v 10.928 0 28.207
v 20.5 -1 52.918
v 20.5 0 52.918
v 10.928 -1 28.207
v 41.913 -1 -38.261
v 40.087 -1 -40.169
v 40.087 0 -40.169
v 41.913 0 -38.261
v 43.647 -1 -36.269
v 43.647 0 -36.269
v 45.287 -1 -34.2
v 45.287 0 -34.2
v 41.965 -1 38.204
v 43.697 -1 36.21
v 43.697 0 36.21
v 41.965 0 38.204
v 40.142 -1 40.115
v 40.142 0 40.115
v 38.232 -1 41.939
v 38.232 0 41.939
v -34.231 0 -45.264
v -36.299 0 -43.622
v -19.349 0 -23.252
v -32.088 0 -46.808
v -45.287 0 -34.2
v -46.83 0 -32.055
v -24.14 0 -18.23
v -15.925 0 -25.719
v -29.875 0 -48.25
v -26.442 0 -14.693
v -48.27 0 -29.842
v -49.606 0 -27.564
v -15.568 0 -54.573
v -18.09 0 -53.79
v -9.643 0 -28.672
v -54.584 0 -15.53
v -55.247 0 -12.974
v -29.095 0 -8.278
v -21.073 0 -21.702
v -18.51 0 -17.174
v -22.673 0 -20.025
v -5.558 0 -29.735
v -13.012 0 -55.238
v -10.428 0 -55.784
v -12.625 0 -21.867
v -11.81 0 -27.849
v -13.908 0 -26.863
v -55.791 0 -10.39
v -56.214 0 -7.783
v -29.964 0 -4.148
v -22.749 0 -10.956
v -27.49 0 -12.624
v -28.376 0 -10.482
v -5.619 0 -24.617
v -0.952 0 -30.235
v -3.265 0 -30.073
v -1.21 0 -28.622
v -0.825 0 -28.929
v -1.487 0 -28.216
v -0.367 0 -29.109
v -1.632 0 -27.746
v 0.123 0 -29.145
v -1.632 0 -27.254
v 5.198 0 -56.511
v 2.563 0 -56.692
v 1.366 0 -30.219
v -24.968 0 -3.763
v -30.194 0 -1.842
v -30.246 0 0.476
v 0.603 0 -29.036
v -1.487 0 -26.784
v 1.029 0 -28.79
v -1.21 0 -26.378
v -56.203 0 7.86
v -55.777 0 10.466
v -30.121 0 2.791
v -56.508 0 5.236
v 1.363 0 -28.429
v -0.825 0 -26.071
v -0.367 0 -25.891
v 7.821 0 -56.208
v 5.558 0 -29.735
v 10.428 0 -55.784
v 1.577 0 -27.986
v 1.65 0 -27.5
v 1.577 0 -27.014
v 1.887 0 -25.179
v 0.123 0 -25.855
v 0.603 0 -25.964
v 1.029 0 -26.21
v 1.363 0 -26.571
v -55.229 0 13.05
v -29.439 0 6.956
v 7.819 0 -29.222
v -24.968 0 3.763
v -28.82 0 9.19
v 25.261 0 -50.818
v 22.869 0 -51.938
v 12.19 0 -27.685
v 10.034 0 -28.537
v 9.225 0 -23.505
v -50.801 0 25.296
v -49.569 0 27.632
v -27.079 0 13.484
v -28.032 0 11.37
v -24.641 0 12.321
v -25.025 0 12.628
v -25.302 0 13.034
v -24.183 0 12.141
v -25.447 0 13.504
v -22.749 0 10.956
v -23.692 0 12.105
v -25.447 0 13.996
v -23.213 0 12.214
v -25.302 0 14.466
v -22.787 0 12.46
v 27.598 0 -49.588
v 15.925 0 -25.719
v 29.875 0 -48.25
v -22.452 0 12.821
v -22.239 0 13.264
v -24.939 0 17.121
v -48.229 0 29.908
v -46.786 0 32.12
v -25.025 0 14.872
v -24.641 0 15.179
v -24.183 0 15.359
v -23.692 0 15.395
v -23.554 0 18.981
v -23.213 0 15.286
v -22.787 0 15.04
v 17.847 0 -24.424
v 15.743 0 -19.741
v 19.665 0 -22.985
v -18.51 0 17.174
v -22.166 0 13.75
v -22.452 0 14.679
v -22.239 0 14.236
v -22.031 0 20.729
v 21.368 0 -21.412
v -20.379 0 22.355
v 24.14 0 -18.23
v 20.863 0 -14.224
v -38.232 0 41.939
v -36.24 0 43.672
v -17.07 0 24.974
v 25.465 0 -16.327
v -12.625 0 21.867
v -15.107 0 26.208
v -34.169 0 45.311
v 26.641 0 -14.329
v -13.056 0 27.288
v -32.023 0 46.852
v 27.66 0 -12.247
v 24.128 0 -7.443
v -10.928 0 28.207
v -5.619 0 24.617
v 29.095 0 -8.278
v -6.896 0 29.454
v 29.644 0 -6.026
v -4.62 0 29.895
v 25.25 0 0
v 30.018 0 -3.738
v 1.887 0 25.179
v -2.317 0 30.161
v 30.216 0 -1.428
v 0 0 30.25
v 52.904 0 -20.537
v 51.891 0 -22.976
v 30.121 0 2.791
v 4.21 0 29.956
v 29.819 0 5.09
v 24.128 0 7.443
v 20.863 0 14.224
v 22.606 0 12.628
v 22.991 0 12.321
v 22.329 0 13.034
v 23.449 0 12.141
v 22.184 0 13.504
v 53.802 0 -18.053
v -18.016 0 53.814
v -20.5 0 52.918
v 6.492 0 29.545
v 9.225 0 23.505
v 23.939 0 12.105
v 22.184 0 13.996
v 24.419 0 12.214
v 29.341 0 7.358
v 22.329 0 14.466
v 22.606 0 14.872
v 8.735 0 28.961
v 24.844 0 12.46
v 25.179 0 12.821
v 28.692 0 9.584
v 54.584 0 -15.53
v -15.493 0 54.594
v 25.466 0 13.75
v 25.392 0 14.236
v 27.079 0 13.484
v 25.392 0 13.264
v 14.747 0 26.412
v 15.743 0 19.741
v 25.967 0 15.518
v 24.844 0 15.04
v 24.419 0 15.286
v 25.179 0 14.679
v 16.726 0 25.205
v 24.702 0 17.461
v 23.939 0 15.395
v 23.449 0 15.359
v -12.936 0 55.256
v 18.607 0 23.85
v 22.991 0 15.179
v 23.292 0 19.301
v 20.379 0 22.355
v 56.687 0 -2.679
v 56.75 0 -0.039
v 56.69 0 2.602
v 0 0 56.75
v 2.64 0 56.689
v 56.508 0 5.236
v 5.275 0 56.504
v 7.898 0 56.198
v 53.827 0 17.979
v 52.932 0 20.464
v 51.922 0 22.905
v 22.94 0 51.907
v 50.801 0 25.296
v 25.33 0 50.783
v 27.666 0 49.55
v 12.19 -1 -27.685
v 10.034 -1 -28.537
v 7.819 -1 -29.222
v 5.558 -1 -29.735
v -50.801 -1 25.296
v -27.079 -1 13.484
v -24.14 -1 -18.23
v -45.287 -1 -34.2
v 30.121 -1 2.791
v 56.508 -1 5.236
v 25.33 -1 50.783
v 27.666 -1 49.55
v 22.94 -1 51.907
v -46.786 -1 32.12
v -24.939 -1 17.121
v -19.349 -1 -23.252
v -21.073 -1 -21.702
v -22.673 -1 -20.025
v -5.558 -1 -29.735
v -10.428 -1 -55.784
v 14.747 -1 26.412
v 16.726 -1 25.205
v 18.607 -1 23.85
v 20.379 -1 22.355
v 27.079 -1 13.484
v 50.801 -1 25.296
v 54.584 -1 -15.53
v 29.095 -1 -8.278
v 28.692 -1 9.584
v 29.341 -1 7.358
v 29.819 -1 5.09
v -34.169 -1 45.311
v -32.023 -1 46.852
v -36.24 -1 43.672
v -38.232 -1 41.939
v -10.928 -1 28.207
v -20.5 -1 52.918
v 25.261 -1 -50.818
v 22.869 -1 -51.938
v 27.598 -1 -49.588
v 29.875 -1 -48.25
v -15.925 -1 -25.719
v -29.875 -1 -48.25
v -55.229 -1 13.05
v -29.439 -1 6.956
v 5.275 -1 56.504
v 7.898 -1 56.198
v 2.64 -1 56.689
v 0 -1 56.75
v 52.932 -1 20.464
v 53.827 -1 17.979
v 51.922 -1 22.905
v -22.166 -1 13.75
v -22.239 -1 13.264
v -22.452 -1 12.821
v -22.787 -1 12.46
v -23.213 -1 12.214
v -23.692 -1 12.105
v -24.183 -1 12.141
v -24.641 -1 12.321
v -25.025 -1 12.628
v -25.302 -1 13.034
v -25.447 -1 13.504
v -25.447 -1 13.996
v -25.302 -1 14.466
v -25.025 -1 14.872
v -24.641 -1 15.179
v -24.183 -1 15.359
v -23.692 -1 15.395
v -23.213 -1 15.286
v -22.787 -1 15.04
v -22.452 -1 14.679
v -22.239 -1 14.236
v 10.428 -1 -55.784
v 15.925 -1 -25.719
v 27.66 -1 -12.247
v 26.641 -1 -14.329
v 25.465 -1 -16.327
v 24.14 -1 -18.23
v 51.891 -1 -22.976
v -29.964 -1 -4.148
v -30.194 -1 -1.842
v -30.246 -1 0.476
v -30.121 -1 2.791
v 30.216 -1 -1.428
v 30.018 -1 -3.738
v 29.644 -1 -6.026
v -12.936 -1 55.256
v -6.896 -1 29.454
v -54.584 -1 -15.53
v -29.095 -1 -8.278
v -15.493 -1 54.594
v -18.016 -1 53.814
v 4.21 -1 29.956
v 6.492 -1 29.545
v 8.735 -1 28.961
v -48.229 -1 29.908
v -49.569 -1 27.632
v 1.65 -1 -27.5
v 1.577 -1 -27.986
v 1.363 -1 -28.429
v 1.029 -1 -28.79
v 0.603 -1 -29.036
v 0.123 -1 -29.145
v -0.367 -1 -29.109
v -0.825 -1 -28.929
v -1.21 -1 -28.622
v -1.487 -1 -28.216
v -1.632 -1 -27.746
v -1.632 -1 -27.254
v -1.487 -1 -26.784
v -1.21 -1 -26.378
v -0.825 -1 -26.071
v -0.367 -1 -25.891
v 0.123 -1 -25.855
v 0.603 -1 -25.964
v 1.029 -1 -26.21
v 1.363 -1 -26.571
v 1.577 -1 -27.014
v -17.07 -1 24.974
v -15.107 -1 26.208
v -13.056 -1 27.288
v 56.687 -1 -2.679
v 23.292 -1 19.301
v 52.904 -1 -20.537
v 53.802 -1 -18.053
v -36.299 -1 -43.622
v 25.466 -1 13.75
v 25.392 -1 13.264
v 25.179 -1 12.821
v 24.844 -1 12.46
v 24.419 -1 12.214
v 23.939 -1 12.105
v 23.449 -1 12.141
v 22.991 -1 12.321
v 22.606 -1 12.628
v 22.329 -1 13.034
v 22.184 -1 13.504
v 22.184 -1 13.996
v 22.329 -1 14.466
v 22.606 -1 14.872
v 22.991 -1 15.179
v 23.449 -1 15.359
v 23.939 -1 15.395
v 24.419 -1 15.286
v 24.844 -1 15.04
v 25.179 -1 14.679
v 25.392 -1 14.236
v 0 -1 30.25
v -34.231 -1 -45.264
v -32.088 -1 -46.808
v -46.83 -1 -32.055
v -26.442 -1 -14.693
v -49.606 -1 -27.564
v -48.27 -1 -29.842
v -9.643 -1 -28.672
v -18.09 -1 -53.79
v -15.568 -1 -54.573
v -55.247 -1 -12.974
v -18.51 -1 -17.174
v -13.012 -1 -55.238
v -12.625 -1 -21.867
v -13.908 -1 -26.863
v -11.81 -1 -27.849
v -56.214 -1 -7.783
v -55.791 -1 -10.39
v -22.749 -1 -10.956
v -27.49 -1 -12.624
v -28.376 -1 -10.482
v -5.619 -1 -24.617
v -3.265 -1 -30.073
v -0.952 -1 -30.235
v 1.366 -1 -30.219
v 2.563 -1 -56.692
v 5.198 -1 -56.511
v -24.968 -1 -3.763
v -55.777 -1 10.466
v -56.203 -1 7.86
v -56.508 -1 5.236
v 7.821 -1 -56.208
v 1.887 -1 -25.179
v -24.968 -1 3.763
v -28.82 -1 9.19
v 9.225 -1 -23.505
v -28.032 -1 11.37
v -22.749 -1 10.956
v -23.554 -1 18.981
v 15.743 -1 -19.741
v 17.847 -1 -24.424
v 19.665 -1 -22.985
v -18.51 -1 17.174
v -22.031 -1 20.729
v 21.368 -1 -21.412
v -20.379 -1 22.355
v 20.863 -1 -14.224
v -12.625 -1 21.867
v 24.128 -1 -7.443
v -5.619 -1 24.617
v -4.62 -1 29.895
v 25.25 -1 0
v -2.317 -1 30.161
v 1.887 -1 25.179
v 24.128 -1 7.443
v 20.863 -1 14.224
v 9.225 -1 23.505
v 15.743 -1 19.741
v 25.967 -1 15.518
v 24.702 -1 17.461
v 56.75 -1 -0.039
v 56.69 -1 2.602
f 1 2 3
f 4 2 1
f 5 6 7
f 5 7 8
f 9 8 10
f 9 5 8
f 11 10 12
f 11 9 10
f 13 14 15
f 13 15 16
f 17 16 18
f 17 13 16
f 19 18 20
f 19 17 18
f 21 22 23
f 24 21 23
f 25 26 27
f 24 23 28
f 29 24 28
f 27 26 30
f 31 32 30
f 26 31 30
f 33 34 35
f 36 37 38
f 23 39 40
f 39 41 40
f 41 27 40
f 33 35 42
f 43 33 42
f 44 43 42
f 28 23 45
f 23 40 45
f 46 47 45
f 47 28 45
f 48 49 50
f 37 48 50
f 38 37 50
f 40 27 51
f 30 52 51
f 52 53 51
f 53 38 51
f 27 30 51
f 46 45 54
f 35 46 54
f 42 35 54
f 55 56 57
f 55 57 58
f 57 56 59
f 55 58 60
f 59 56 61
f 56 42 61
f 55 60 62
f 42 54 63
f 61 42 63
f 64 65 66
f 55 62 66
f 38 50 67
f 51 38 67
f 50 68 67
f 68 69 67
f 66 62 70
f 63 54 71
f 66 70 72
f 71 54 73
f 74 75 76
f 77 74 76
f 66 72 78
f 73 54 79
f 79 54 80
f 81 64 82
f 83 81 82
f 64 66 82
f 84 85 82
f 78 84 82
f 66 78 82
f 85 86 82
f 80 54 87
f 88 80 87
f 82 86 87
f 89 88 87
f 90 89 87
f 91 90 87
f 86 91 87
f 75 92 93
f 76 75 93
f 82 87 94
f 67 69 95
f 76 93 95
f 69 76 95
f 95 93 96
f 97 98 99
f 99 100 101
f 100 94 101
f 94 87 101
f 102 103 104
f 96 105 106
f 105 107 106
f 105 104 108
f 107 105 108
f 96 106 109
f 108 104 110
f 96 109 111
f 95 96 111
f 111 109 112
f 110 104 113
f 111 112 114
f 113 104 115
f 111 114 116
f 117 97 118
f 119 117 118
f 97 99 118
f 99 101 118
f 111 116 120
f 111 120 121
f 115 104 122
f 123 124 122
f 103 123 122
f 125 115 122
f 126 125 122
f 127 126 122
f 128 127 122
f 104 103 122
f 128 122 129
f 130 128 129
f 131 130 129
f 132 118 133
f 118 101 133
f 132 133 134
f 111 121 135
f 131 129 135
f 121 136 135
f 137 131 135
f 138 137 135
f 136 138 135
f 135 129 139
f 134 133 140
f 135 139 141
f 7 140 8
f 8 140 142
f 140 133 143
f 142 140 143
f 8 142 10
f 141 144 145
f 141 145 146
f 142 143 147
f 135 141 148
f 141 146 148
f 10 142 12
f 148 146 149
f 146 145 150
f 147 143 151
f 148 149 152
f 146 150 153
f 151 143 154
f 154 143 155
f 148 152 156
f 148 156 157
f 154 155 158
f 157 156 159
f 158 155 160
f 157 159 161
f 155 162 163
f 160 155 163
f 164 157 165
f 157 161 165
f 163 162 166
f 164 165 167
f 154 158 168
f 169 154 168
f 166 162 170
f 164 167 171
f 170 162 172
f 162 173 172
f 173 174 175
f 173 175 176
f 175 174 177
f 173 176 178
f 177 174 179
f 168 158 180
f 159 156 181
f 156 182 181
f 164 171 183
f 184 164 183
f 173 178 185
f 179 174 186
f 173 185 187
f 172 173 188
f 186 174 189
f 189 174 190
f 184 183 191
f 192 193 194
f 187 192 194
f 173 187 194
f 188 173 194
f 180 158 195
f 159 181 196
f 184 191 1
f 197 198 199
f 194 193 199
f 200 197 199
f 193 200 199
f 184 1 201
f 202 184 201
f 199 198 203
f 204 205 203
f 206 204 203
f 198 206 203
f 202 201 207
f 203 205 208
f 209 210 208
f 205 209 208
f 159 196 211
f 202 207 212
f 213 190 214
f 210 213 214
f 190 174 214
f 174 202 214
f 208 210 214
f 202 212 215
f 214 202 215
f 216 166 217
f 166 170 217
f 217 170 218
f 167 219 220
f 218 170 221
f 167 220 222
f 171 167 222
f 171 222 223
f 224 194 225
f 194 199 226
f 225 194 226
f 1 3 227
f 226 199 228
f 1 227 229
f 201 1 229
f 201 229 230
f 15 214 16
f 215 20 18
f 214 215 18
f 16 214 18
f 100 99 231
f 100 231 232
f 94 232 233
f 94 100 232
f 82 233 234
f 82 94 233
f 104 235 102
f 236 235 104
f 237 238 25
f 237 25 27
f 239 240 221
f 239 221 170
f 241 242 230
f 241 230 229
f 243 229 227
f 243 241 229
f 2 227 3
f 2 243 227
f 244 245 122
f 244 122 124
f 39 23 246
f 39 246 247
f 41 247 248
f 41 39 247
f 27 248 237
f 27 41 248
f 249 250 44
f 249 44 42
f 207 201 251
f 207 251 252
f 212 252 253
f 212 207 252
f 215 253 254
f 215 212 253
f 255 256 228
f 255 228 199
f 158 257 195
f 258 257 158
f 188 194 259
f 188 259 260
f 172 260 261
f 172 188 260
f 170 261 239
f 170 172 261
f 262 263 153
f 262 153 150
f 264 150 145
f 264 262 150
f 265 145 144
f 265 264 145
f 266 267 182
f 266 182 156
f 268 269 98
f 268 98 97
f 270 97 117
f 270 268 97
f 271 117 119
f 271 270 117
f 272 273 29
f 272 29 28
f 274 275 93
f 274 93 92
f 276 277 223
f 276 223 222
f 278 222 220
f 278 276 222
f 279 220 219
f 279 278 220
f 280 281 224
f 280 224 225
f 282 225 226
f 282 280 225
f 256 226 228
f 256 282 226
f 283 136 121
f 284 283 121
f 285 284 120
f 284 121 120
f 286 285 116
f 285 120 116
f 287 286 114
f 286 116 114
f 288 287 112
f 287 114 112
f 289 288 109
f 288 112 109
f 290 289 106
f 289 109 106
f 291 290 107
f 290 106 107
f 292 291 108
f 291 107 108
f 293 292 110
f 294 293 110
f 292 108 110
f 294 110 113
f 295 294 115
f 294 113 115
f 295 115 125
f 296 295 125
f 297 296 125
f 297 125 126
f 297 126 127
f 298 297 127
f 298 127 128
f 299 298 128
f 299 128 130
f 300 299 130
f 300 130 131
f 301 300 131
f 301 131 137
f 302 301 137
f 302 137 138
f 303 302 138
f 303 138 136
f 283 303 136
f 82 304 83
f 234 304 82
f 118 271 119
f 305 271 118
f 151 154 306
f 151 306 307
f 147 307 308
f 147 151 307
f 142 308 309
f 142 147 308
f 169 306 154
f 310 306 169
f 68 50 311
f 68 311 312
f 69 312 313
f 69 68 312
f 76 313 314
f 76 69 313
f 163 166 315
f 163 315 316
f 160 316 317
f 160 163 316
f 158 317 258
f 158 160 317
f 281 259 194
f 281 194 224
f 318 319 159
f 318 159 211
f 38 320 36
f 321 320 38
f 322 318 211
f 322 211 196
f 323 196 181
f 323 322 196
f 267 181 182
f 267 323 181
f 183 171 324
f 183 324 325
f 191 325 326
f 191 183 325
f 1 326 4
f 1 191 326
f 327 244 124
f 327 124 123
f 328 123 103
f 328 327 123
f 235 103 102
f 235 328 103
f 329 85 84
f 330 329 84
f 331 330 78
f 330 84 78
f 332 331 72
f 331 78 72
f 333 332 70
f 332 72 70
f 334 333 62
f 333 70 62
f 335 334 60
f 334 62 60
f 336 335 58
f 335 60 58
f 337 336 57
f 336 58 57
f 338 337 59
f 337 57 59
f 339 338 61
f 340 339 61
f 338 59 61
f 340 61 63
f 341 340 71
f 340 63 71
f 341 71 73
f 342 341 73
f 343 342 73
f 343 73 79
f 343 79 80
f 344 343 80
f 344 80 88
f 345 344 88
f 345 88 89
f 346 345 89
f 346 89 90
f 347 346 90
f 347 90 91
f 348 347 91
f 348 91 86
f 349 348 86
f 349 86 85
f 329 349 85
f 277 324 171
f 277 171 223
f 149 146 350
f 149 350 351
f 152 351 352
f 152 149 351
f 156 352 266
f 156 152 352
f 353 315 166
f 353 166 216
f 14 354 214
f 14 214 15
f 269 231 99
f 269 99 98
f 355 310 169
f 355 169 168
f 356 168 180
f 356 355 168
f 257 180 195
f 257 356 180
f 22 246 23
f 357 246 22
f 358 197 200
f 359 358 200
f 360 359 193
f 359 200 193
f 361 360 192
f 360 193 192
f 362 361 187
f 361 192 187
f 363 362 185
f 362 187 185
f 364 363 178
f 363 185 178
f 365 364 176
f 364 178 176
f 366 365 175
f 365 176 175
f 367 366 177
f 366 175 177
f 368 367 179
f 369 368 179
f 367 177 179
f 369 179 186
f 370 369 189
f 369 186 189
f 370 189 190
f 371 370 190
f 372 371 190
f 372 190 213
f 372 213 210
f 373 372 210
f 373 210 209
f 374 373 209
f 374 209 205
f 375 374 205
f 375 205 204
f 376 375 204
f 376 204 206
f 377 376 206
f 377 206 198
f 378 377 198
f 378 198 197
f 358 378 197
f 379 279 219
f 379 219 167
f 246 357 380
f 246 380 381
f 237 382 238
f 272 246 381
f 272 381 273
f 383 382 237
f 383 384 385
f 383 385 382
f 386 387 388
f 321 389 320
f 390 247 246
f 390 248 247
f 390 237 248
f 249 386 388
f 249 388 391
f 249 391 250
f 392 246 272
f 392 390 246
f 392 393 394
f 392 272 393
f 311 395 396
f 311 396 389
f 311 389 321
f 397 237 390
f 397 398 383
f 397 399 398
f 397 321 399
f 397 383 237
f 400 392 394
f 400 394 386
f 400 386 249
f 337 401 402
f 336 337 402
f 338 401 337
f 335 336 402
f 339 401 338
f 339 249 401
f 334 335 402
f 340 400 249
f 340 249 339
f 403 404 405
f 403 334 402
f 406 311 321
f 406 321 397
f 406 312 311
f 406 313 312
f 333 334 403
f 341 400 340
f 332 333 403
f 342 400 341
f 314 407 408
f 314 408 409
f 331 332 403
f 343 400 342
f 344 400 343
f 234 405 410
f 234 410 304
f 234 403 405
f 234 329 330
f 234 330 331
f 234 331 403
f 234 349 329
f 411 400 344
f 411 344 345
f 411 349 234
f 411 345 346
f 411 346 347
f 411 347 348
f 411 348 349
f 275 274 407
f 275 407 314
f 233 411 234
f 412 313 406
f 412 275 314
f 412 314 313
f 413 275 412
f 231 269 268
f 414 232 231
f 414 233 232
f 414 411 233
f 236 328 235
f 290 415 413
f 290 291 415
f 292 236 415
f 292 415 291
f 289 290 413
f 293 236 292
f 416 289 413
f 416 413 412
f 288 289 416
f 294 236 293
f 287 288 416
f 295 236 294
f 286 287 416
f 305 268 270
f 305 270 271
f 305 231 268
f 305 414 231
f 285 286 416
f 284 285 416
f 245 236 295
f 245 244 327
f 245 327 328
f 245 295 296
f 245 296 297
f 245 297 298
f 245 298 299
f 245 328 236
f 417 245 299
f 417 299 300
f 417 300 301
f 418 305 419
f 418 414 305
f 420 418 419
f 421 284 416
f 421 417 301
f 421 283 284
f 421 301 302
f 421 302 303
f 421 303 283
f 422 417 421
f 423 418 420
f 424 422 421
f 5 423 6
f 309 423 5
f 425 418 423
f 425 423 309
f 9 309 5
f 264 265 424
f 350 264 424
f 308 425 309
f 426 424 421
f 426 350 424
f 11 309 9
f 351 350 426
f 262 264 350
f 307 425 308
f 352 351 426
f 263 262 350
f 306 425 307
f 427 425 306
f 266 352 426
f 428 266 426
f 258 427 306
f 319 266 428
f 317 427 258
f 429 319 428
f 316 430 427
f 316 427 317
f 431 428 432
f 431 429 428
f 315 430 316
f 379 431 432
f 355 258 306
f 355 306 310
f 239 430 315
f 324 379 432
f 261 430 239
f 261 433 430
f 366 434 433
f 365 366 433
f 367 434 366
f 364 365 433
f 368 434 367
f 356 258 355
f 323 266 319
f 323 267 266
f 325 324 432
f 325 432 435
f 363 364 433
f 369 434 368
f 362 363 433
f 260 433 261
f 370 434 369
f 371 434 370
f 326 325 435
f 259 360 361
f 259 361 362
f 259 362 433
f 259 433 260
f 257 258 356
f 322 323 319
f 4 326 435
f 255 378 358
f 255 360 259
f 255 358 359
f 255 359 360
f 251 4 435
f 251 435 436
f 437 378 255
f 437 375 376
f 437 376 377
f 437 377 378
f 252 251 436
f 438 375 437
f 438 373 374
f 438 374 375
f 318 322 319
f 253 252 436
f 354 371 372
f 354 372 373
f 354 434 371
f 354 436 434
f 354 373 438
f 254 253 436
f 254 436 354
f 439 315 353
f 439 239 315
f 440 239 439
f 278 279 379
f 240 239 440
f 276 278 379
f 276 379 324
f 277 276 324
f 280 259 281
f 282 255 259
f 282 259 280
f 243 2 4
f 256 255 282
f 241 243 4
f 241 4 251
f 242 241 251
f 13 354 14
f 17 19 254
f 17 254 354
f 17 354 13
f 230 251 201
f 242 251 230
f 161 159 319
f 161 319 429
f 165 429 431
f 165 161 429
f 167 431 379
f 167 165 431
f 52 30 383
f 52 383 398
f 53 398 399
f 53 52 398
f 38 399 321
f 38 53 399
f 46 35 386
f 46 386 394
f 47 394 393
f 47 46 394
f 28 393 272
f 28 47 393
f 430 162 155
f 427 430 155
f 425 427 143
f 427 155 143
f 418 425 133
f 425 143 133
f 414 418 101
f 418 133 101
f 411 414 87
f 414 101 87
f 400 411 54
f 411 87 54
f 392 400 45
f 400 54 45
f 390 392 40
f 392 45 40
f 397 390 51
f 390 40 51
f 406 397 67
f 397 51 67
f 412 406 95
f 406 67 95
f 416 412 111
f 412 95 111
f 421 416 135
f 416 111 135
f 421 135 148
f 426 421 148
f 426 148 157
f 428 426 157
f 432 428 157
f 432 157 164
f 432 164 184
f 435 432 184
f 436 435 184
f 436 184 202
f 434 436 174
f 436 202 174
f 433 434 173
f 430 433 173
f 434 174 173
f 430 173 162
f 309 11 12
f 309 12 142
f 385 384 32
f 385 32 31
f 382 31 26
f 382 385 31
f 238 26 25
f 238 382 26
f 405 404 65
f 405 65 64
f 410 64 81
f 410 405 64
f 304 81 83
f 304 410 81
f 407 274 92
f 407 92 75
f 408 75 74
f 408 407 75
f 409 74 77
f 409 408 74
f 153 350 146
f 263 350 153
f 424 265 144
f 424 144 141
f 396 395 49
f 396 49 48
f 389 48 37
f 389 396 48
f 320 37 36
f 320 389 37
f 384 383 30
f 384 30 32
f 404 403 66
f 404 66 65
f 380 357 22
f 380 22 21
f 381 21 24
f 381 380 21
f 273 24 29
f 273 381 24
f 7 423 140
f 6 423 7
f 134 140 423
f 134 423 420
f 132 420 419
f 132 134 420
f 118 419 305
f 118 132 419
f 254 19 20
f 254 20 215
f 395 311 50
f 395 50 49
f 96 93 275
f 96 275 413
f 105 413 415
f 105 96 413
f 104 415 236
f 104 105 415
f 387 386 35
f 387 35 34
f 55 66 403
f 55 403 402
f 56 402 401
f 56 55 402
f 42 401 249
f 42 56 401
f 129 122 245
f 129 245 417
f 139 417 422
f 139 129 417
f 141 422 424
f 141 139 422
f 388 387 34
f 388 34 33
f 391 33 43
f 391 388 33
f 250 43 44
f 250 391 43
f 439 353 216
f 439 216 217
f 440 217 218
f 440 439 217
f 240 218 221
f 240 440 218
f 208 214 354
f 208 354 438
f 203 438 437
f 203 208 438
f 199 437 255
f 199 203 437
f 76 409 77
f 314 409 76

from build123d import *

# Parameters (mm, degrees)
SKETCH1_R           = 30.25
SKETCH1_R_2         = 25.25
EXTRUDE_THIN1_DEPTH = 1
SKETCH2_R           = 1.65
CUT_EXTRUDE3_DEPTH  = 10
BOSS_EXTRUDE1_DEPTH = 1


with BuildPart() as part:
    # Sketch1 → Extrude-Thin1 (new body)
    with BuildSketch(Plane(origin=(0, 0, 0), x_dir=(1, 0, 0), z_dir=(0, 1, 0))):
        Circle(SKETCH1_R)
        Circle(SKETCH1_R_2, mode=Mode.SUBTRACT)
    extrude(amount=-EXTRUDE_THIN1_DEPTH)

    # Sketch2 → Cut-Extrude3 (cut)
    with BuildSketch(Plane(origin=(0, 0, 0), x_dir=(1, 0, 0), z_dir=(0, 1, 0))):
        with Locations((0, 27.5)):
            Circle(SKETCH2_R)
        with Locations((23.815698604, -13.75)):
            Circle(SKETCH2_R)
        with Locations((-23.815698604, -13.75)):
            Circle(SKETCH2_R)
    extrude(amount=-CUT_EXTRUDE3_DEPTH, mode=Mode.SUBTRACT)

    # Sketch5 → Boss-Extrude1 (add)
    with BuildSketch(Plane.XZ.offset(1)):
        with BuildLine():
            Line((0, 56.75), (0, 30.25))
            ThreePointArc((0, 30.25), (2.110133331, 30.17631252), (4.209986304, 29.955609079))
            Line((4.209986304, 29.955609079), (7.898073479, 56.197712901))
            ThreePointArc((7.898073479, 56.197712901), (3.958679885, 56.611759852), (0, 56.75))
        make_face()
        with BuildLine():
            Line((20.500464556, 52.917799019), (10.927560402, 28.207284939))
            ThreePointArc((10.927560402, 28.207284939), (12.868582146, 27.376305331), (14.74690945, 26.411951114))
            Line((14.74690945, 26.411951114), (27.66568963, 49.549693413))
            ThreePointArc((27.66568963, 49.549693413), (24.141885513, 51.358853802), (20.500464556, 52.917799019))
        make_face()
        with BuildLine():
            Line((38.232227777, 41.938756052), (20.37929322, 22.355019746))
            ThreePointArc((20.37929322, 22.355019746), (21.889057634, 20.878976409), (23.29218076, 19.301212798))
            Line((23.29218076, 19.301212798), (43.696901095, 36.209713265))
            ThreePointArc((43.696901095, 36.209713265), (41.064595727, 39.169649957), (38.232227777, 41.938756052))
        make_face()
        with BuildLine():
            Line((50.800516784, 25.29565169), (27.078689563, 13.483585262))
            ThreePointArc((27.078689563, 13.483585262), (27.953294598, 11.561826029), (28.691713991, 9.583738741))
            Line((28.691713991, 9.583738741), (53.826603934, 17.979410696))
            ThreePointArc((53.826603934, 17.979410696), (52.441304742, 21.690367839), (50.800516784, 25.29565169))
        make_face()
        with BuildLine():
            Line((56.507914505, 5.2362294), (30.120958833, 2.791117874))
            ThreePointArc((30.120958833, 2.791117874), (30.242284232, 0.683186977), (30.216272262, -1.428072338))
            Line((30.216272262, -1.428072338), (56.686725648, -2.679110915))
            ThreePointArc((56.686725648, -2.679110915), (56.735524964, 1.281681353), (56.507914505, 5.2362294))
        make_face()
        with BuildLine():
            Line((54.58360525, -15.530374687), (29.095225706, -8.27830545))
            ThreePointArc((29.095225706, -8.27830545), (28.446885802, -10.287720262), (27.659955529, -12.247014335))
            Line((27.659955529, -12.247014335), (51.890990952, -22.975803752))
            ThreePointArc((51.890990952, -22.975803752), (53.367298157, -19.300103301), (54.58360525, -15.530374687))
        make_face()
        with BuildLine():
            Line((45.287477648, -34.199515615), (24.140021125, -18.22969775))
            ThreePointArc((24.140021125, -18.22969775), (22.809577815, -19.869213873), (21.368008534, -21.411929182))
            Line((21.368008534, -21.411929182), (40.087090389, -40.169486978))
            ThreePointArc((40.087090389, -40.169486978), (42.791522016, -37.275302059), (45.287477648, -34.199515615))
        make_face()
        with BuildLine():
            Line((29.875025243, -48.249822453), (15.924572927, -25.719068356))
            ThreePointArc((15.924572927, -25.719068356), (14.091709951, -26.767260051), (12.190193581, -27.685044346))
            Line((12.190193581, -27.685044346), (22.86920614, -51.938058402))
            ThreePointArc((22.86920614, -51.938058402), (26.43651371, -50.216264724), (29.875025243, -48.249822453))
        make_face()
        with BuildLine():
            Line((10.427785136, -55.783723407), (5.558422914, -29.734936265))
            ThreePointArc((5.558422914, -29.734936265), (3.470678574, -30.050239437), (1.366025437, -30.219140863))
            Line((1.366025437, -30.219140863), (2.562708878, -56.692107239))
            ThreePointArc((2.562708878, -56.692107239), (6.511107738, -56.375242581), (10.427785136, -55.783723407))
        make_face()
        with BuildLine():
            Line((-10.427785136, -55.783723407), (-5.558422914, -29.734936265))
            ThreePointArc((-5.558422914, -29.734936265), (-7.619087176, -29.274767473), (-9.642632011, -28.671974956))
            Line((-9.642632011, -28.671974956), (-18.089896418, -53.789572852))
            ThreePointArc((-18.089896418, -53.789572852), (-14.293659413, -54.92043154), (-10.427785136, -55.783723407))
        make_face()
        with BuildLine():
            Line((-29.875025243, -48.249822453), (-15.924572927, -25.719068356))
            ThreePointArc((-15.924572927, -25.719068356), (-17.679852984, -24.545575945), (-19.348998575, -23.252499955))
            Line((-19.348998575, -23.252499955), (-36.299360963, -43.622458593))
            ThreePointArc((-36.299360963, -43.622458593), (-33.167988656, -46.048311896), (-29.875025243, -48.249822453))
        make_face()
        with BuildLine():
            Line((-45.287477648, -34.199515615), (-24.140021125, -18.22969775))
            ThreePointArc((-24.140021125, -18.22969775), (-25.35285668, -16.501368373), (-26.442175665, -14.692645988))
            Line((-26.442175665, -14.692645988), (-49.606395668, -27.563889581))
            ThreePointArc((-49.606395668, -27.563889581), (-47.562797242, -30.957112568), (-45.287477648, -34.199515615))
        make_face()
        with BuildLine():
            Line((-54.58360525, -15.530374687), (-29.095225706, -8.27830545))
            ThreePointArc((-29.095225706, -8.27830545), (-29.601816595, -6.228559566), (-29.96419041, -4.148468765))
            Line((-29.96419041, -4.148468765), (-56.21381176, -7.782664543))
            ThreePointArc((-56.21381176, -7.782664543), (-55.533986505, -11.684983648), (-54.58360525, -15.530374687))
        make_face()
        with BuildLine():
            Line((-56.507914505, 5.2362294), (-30.120958833, 2.791117874))
            ThreePointArc((-30.120958833, 2.791117874), (-29.85288715, 4.885450725), (-29.439375202, 6.955982151))
            Line((-29.439375202, 6.955982151), (-55.229241082, 13.049652465))
            ThreePointArc((-55.229241082, 13.049652465), (-56.005003166, 9.165267062), (-56.507914505, 5.2362294))
        make_face()
        with BuildLine():
            Line((-50.800516784, 25.29565169), (-27.078689563, 13.483585262))
            ThreePointArc((-27.078689563, 13.483585262), (-26.072159875, 15.339653824), (-24.938609245, 17.120989134))
            Line((-24.938609245, 17.120989134), (-46.785655361, 32.119541598))
            ThreePointArc((-46.785655361, 32.119541598), (-48.912233816, 28.777697669), (-50.800516784, 25.29565169))
        make_face()
        with BuildLine():
            Line((-38.232227777, 41.938756052), (-20.37929322, 22.355019746))
            ThreePointArc((-20.37929322, 22.355019746), (-18.770242938, 23.722151674), (-17.06974592, 24.973711663))
            Line((-17.06974592, 24.973711663), (-32.023407634, 46.851508658))
            ThreePointArc((-32.023407634, 46.851508658), (-35.213596256, 44.503540743), (-38.232227777, 41.938756052))
        make_face()
        with BuildLine():
            Line((-20.500464556, 52.917799019), (-10.927560402, 28.207284939))
            ThreePointArc((-10.927560402, 28.207284939), (-8.933300683, 28.900841491), (-6.895518821, 29.453596049))
            Line((-6.895518821, 29.453596049), (-12.936221259, 55.25591986))
            ThreePointArc((-12.936221259, 55.25591986), (-16.759167397, 54.218934037), (-20.500464556, 52.917799019))
        make_face()
    extrude(amount=-BOSS_EXTRUDE1_DEPTH)


solid = part.part
